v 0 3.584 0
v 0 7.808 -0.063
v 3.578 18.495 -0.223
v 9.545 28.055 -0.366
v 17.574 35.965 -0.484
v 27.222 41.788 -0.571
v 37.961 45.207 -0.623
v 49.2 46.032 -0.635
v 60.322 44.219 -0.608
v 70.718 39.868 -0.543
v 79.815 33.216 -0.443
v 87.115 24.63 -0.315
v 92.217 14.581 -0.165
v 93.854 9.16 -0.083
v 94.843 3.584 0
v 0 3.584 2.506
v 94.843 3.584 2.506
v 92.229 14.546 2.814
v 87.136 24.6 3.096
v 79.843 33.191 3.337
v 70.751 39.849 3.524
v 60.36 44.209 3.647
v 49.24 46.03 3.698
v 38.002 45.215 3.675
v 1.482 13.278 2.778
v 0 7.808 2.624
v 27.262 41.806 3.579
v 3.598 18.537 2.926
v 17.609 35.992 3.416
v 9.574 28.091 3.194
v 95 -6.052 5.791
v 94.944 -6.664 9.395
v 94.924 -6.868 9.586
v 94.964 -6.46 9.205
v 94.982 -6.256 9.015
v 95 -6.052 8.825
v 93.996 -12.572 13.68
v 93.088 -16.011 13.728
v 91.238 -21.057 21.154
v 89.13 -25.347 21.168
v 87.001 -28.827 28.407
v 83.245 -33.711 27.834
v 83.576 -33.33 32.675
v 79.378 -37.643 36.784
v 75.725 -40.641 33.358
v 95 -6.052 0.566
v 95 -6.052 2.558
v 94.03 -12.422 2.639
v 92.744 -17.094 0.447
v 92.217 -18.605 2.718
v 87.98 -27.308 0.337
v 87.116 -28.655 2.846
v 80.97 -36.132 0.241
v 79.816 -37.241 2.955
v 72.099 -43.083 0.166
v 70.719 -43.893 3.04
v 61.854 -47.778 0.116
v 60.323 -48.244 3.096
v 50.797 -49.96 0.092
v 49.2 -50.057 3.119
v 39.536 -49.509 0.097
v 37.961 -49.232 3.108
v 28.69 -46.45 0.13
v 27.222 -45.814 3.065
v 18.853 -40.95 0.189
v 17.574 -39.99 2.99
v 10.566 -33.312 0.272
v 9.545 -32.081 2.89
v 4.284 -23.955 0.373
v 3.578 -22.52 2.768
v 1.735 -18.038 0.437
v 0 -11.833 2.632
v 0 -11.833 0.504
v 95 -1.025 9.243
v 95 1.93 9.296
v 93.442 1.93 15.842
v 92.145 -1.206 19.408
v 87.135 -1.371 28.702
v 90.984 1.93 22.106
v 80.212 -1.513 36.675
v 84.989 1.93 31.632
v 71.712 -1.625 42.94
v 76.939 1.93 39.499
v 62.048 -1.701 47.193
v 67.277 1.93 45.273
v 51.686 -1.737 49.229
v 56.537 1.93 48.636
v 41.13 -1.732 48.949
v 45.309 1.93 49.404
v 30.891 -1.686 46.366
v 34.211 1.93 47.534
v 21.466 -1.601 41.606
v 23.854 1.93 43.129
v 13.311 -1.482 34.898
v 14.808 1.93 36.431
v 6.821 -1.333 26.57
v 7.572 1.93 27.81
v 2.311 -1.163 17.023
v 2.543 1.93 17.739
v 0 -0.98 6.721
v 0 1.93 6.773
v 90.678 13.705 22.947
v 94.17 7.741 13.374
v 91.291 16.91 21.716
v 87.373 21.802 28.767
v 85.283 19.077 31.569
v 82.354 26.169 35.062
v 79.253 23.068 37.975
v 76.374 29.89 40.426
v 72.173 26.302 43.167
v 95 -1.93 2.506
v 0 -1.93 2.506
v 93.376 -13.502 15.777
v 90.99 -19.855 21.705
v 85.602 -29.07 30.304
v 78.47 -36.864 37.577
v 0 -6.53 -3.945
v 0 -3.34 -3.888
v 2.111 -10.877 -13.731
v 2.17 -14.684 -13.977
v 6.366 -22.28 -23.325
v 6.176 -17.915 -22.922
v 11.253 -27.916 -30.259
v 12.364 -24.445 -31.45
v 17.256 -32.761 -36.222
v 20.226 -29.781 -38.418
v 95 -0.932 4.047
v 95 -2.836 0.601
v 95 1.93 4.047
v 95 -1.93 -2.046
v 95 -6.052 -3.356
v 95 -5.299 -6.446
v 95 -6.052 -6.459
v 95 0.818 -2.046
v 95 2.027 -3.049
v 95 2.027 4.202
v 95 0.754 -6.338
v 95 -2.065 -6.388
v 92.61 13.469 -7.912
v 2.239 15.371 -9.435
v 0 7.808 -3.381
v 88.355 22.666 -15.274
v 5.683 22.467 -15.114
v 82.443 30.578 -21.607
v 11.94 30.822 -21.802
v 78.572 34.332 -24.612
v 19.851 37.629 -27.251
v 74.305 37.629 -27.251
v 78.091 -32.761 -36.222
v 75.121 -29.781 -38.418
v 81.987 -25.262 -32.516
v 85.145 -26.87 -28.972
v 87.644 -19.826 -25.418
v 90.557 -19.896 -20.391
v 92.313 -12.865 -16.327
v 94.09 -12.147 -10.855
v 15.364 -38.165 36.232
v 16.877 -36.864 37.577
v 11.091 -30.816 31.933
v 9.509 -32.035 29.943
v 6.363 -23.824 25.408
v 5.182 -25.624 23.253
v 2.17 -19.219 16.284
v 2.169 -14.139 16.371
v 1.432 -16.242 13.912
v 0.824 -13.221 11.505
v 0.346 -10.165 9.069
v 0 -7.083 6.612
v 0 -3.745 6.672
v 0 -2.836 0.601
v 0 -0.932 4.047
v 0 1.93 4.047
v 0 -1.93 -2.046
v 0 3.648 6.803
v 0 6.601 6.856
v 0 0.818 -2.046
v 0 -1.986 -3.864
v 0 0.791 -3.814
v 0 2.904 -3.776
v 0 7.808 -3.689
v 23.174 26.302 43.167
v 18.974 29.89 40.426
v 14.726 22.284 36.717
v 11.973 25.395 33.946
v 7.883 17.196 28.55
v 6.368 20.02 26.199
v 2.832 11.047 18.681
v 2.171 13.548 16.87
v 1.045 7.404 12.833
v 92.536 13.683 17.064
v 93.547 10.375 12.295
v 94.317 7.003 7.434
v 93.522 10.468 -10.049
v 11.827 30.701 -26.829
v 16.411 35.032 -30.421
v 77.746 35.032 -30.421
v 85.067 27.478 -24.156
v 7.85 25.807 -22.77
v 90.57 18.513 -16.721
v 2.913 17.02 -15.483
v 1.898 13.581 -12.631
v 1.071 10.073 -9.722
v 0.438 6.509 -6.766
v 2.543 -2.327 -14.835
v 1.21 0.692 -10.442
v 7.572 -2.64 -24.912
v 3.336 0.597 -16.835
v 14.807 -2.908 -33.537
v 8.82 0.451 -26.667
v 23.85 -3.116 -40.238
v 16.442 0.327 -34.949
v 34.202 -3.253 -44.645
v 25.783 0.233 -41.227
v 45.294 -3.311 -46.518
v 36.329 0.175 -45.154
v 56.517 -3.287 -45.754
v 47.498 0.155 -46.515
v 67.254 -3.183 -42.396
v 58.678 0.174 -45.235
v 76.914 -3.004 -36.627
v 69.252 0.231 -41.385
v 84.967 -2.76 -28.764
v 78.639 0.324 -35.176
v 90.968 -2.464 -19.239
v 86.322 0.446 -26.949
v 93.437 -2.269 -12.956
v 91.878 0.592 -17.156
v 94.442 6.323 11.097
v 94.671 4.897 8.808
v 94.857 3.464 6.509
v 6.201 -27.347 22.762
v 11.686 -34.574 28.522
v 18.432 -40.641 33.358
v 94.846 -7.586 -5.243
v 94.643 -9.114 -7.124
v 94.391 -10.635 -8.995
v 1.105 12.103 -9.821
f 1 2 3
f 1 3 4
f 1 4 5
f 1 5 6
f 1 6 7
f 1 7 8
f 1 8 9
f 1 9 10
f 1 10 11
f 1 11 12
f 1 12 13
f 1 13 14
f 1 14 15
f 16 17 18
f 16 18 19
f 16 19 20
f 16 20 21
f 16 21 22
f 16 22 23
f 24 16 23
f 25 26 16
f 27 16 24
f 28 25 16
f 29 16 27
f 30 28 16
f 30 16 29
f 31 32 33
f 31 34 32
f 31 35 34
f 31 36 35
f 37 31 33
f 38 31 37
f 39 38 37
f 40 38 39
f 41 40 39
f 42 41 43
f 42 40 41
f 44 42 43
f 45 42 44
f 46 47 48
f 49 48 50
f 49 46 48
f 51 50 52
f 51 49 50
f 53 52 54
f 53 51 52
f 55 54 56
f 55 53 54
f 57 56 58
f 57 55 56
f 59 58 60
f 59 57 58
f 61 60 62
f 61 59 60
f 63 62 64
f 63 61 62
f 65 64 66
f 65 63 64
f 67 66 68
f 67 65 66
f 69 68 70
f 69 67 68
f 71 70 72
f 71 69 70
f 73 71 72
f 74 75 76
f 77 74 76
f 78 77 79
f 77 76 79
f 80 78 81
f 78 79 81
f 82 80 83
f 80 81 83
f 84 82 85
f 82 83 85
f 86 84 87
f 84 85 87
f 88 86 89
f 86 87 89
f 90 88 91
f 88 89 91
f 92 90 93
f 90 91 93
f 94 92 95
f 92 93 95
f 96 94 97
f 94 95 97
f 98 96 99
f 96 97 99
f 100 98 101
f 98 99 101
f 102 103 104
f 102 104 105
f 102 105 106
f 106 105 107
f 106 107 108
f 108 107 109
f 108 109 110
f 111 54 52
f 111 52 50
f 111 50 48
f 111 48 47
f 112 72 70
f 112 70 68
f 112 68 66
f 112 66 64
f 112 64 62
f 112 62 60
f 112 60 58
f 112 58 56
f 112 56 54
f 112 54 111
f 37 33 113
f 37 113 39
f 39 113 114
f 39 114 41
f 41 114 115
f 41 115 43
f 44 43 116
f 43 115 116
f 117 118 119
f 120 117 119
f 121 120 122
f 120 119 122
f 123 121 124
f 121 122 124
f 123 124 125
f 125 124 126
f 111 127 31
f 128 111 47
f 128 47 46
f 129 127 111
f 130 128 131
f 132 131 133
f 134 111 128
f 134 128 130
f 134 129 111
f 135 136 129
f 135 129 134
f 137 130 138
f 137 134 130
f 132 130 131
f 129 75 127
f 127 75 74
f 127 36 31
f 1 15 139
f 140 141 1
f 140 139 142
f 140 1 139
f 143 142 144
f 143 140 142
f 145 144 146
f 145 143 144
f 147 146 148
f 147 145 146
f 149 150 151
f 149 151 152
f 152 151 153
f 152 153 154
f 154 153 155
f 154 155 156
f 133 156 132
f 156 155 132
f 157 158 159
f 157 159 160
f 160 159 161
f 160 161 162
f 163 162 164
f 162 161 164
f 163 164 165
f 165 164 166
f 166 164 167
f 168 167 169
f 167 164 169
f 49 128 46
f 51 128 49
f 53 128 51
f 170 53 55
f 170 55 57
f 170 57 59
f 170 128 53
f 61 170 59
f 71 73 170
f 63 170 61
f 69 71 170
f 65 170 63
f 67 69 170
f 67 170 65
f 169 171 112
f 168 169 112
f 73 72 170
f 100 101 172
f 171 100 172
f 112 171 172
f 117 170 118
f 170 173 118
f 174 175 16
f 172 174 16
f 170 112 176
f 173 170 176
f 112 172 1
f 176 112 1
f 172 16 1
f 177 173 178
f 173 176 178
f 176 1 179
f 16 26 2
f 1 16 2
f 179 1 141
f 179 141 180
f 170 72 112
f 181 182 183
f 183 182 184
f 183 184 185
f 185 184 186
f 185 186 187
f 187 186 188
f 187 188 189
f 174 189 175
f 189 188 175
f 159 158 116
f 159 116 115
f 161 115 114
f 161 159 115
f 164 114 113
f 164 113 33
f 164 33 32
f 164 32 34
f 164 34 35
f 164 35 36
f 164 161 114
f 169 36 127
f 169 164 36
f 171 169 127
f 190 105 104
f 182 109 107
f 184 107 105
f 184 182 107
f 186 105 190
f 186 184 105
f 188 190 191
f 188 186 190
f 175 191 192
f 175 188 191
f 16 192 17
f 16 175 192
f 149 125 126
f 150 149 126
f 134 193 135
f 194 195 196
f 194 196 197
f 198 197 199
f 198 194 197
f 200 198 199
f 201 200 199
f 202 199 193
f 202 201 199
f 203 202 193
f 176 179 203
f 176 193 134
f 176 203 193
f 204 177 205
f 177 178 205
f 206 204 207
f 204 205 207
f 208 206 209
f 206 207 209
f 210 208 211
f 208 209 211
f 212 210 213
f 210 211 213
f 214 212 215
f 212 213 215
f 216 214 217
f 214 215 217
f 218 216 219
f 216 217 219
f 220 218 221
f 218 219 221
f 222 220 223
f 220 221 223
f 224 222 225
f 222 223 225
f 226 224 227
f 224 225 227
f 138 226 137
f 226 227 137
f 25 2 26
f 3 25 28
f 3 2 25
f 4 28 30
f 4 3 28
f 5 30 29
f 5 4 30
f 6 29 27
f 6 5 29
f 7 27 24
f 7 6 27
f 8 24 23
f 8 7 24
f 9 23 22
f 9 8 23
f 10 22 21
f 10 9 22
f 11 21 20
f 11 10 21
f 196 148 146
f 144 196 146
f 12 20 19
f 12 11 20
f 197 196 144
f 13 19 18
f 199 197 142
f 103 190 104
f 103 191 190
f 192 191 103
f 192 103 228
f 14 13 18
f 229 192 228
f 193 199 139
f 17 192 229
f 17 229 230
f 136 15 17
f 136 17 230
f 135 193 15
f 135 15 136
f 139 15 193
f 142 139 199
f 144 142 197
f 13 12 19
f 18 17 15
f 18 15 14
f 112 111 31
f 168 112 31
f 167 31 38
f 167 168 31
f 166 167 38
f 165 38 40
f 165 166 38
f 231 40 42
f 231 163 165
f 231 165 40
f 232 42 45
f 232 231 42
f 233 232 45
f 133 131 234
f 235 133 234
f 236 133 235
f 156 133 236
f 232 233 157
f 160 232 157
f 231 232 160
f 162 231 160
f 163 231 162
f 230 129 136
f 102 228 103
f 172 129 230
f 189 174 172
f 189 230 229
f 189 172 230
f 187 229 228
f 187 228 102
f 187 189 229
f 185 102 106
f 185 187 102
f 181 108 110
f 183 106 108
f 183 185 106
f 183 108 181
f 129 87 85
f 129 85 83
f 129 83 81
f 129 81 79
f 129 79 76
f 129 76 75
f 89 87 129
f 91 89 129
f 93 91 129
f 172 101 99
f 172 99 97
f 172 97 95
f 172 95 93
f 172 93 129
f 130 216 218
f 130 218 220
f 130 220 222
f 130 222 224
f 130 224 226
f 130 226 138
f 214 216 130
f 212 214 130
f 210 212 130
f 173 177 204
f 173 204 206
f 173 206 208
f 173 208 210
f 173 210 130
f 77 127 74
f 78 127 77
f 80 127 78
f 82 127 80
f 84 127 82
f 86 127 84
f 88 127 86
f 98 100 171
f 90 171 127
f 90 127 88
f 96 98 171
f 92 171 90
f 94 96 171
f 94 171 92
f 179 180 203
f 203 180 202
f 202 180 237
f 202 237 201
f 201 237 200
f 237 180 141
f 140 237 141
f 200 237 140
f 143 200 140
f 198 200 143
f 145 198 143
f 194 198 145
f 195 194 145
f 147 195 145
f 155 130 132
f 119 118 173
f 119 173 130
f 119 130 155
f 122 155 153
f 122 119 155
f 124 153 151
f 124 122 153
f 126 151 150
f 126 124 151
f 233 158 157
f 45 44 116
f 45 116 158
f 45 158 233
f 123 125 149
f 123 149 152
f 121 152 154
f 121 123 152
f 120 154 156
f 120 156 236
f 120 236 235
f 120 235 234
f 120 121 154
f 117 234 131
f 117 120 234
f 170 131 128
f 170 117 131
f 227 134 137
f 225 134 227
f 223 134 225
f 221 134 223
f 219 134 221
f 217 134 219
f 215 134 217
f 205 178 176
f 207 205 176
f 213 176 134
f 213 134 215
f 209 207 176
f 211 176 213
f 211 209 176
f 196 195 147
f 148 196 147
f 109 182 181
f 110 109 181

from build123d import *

# Parameters (mm, degrees)
SKETCH1_R               = 58.499168585
BOSS_EXTRUDE1_DEPTH     = 95
CUT_EXTRUDE3_DEPTH      = 100
SKETCH4_W               = 9.373072574
SKETCH4_H               = 2.086863183
SKETCH4_W_2             = 2.476243421
SKETCH4_H_2             = 12.533404649
CUT_EXTRUDE4_DEPTH      = 127.730498931
SKETCH5_R               = 85.185879132
SKETCH5_R_2             = 48.091620782
CUT_EXTRUDE6_DEPTH      = 162.424468201
CUT_EXTRUDE9_DEPTH      = 123.740942834
CUT_EXTRUDE9_DEPTH_BACK = 123.740942834
SKETCH6_R               = 79.179320002
SKETCH6_R_2             = 47.965553318
SKETCH7_R               = 65.670207134
SKETCH7_R_2             = 49.501482781
CUT_EXTRUDE11_DEPTH     = 100


with BuildPart() as part:
    # Sketch1 → Boss-Extrude1 (new body)
    with BuildSketch(Plane(origin=(0, 0, 0), x_dir=(0, 0, -1), z_dir=(1, 0, 0))):
        with Locations((-1.612948614, 0)):
            Circle(SKETCH1_R)
    extrude(amount=BOSS_EXTRUDE1_DEPTH)

    # Sketch2 → Cut-Extrude3 (cut)
    with BuildSketch(Plane.ZY):
        Polygon((-34.616587509, 50.080454684), (-34.616587509, 62.895572105), (-0.820688819, 58.448525507), (0, 3.58366071), (-34.293670433, 46.428785299), align=None)
        with BuildLine():
            Line((-37.468242519, 43.529452383), (-2.046271026, 0.817665198))
            Line((-2.046271026, 0.817665198), (-56.886219972, 0))
            add(Edge.make_bspline(
                [(-37.468242519, 43.529452383), (-81.726208007, 46.47230528), (-56.886219972, 0)],
                knots=[0, 0, 0, 1, 1, 1], degree=2))
        make_face()
        with BuildLine():
            Line((-56.773526724, -3.629355702), (-2.046271026, -1.930047978))
            Line((-2.046271026, -1.930047978), (-45.251031563, -35.013141635))
            add(Edge.make_bspline(
                [(-56.773526724, -3.629355702), (-82.637840847, -33.762491691), (-45.251031563, -35.013141635)],
                knots=[0, 0, 0, 1, 1, 1], degree=2))
        make_face()
        with BuildLine():
            Line((-42.78323994, -38.093715585), (0.600944507, -2.836333045))
            Line((0.600944507, -2.836333045), (0, -58.476928116))
            add(Edge.make_bspline(
                [(-42.78323994, -38.093715585), (-42.157907188, -81.245363376), (0, -58.476928116)],
                knots=[0, 0, 0, 1, 1, 1], degree=2))
        make_face()
        with BuildLine():
            Line((3.225897227, -58.476928116), (2.505757473, -1.930047978))
            Line((2.505757473, -1.930047978), (37.676550811, -46.060496325))
            add(Edge.make_bspline(
                [(37.676550811, -46.060496325), (44.967631713, -79.6133954), (3.225897227, -58.476928116)],
                knots=[0, 0, 0, 1, 1, 1], degree=2))
        make_face()
        with BuildLine():
            Line((42.352672899, -41.981276663), (4.046586047, -0.931979638))
            Line((4.046586047, -0.931979638), (60.080269742, -1.930047978))
            add(Edge.make_bspline(
                [(60.080269742, -1.930047978), (94.049932739, -36.726987631), (42.352672899, -41.981276663)],
                knots=[0, 0, 0, 1, 1, 1], degree=2))
        make_face()
        with BuildLine():
            Line((60.080269742, 1.930047978), (4.046586047, 1.930047978))
            Line((4.046586047, 1.930047978), (51.077950448, 31.230855234))
            add(Edge.make_bspline(
                [(51.077950448, 31.230855234), (102.146773926, 32.028777375), (60.080269742, 1.930047978)],
                knots=[0, 0, 0, 1, 1, 1], degree=2))
        make_face()
        with BuildLine():
            Line((48.248640535, 35.316638631), (2.505757473, 3.58366071))
            Line((2.505757473, 3.58366071), (4.046586047, 58.448525507))
            add(Edge.make_bspline(
                [(4.046586047, 58.448525507), (39.246107014, 77.741383534), (48.248640535, 35.316638631)],
                knots=[0, 0, 0, 1, 1, 1], degree=2))
        make_face()
    extrude(amount=-CUT_EXTRUDE3_DEPTH, mode=Mode.SUBTRACT)

    # Sketch4 → Cut-Extrude4 (cut, through all)
    with BuildSketch(Plane.ZY):
        with Locations((2.834262756, 59.310645652)):
            Rectangle(SKETCH4_W, SKETCH4_H)
        with Locations((-57.79093587, -1.746234162)):
            Rectangle(SKETCH4_W_2, SKETCH4_H_2)
    extrude(amount=-CUT_EXTRUDE4_DEPTH, mode=Mode.SUBTRACT)

    # Sketch5 → Cut-Extrude6 (cut, through all)
    with BuildSketch(Plane(origin=(0, 0, -56.552814159), x_dir=(-1, 0, 0), z_dir=(0, 0, -1))):
        with Locations((-47.078327147, -2.012615685)):
            Circle(SKETCH5_R)
        with Locations((-47.078327147, -2.012615685)):
            Circle(SKETCH5_R_2, mode=Mode.SUBTRACT)
    extrude(amount=-CUT_EXTRUDE6_DEPTH, mode=Mode.SUBTRACT)

    # Sketch6 → Cut-Extrude9 (cut, two sides: drawn at the far end of the back side and taken through both)
    with BuildSketch(Plane(origin=(0, -0.859629379, -0.015311663), x_dir=(-1, 0, 0), z_dir=(0, -0.9998414052195305, -0.017809110270727707)).offset(-CUT_EXTRUDE9_DEPTH_BACK)):
        with Locations((-47.673789364, -1.454840891)):
            Circle(SKETCH6_R)
        with Locations((-47.673789364, -1.454840891)):
            Circle(SKETCH6_R_2, mode=Mode.SUBTRACT)
    extrude(amount=CUT_EXTRUDE9_DEPTH + CUT_EXTRUDE9_DEPTH_BACK, mode=Mode.SUBTRACT)

    # Sketch7 → Cut-Extrude11 (cut)
    with BuildSketch(Plane(origin=(95, 0, 0), x_dir=(0, 0, -1), z_dir=(1, 0, 0))):
        with Locations((-2.505757473, -1.930047978)):
            Circle(SKETCH7_R)
        with Locations((-2.505757473, -1.930047978)):
            Circle(SKETCH7_R_2, mode=Mode.SUBTRACT)
    extrude(amount=-CUT_EXTRUDE11_DEPTH, mode=Mode.SUBTRACT)


solid = part.part
